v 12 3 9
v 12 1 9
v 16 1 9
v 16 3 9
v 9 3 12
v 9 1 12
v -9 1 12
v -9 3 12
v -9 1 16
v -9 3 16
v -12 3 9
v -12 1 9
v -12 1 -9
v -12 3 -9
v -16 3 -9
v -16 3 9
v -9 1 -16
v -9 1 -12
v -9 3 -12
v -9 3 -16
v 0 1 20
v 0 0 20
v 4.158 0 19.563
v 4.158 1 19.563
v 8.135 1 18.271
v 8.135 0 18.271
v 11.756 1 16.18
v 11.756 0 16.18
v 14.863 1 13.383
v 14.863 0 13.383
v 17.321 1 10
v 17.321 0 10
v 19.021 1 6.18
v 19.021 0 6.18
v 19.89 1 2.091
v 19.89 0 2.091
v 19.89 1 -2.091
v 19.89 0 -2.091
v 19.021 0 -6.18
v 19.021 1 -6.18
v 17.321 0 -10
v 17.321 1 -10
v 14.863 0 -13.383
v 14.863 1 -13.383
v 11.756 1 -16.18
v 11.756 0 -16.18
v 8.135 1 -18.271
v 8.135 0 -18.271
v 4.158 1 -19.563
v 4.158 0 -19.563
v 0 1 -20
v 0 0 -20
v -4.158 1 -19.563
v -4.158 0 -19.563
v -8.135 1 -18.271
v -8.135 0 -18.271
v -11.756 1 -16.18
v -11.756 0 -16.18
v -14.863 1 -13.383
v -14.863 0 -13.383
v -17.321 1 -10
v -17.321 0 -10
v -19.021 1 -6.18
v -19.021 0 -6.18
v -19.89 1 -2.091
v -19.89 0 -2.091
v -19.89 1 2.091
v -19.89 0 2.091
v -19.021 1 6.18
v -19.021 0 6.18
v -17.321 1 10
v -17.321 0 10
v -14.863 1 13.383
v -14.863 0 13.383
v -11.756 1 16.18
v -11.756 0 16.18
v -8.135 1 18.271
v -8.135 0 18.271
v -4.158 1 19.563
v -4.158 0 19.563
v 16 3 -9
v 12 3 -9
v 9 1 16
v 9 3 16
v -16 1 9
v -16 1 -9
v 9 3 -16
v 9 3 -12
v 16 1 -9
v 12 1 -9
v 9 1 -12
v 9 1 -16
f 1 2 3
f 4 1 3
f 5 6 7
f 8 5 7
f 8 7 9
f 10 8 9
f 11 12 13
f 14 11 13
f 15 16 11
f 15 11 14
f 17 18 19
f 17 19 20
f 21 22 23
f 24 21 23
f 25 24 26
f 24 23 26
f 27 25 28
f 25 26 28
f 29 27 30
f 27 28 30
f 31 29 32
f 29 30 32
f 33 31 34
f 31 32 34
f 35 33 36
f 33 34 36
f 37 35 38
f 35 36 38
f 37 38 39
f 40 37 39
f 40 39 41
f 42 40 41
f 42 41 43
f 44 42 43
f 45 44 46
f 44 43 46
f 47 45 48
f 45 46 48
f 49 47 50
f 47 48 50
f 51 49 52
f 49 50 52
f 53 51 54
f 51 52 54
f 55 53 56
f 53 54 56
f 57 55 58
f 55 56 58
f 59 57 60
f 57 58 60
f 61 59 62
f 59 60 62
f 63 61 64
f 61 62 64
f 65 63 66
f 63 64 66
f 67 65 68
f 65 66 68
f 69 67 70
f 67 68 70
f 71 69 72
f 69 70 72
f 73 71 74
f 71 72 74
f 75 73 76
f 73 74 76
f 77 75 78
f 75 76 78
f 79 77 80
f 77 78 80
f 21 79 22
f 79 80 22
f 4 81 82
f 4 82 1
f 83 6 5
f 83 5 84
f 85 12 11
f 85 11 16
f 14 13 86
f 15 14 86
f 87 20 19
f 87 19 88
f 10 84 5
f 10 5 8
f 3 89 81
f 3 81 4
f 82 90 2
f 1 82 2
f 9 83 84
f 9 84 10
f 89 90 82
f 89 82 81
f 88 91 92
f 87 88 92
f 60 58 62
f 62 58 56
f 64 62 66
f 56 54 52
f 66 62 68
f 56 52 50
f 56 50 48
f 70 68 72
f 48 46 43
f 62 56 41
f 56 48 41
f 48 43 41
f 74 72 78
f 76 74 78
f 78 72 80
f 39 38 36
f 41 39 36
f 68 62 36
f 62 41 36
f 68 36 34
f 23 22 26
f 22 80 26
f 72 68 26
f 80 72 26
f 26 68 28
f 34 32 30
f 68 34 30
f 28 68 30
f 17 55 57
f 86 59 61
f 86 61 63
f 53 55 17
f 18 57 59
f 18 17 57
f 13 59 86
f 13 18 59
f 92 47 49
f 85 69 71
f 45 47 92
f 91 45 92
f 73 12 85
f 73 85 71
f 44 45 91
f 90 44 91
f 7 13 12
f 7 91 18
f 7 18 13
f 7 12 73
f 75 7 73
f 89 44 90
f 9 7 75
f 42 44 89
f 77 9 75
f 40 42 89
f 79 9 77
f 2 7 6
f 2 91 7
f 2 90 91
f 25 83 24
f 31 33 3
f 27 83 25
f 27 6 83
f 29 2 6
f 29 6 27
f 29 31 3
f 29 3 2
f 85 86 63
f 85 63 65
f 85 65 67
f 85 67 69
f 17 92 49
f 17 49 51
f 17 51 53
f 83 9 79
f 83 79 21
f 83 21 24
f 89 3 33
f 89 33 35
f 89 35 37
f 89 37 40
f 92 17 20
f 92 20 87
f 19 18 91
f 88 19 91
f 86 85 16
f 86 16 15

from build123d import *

# Parameters (mm, degrees)
SKETCH1_R                    = 20
PCB_DEPTH                    = 1
SKETCH2_W                    = 18
SKETCH2_H                    = 4
HIROSE_CONNECTOR_STACK_DEPTH = 2
CIRPATTERN1_COUNT            = 4


with BuildPart() as part:
    # Sketch1 → PCB (new body)
    with BuildSketch(Plane(origin=(0, 0, 0), x_dir=(1, 0, 0), z_dir=(0, 1, 0))):
        with Locations(Location((0, 0, 0), (0, 0, 270))):
            Circle(SKETCH1_R)
    extrude(amount=PCB_DEPTH)

    # Sketch2 → Hirose Connector Stack (add)
    with BuildSketch(Plane(origin=(0, 1, 0), x_dir=(1, 0, 0), z_dir=(0, 1, 0))):
        with Locations((0, 14)):
            Rectangle(SKETCH2_W, SKETCH2_H)
    hirose_connector_stack = extrude(amount=HIROSE_CONNECTOR_STACK_DEPTH)

    # CirPattern1: Hirose Connector Stack ×4 about axis
    cirpattern1_axis = Axis((0, 0, 0), (0, 1, 0))
    for i in range(1, CIRPATTERN1_COUNT):
        add(hirose_connector_stack.rotate(cirpattern1_axis, i * 360 / CIRPATTERN1_COUNT))


solid = part.part
